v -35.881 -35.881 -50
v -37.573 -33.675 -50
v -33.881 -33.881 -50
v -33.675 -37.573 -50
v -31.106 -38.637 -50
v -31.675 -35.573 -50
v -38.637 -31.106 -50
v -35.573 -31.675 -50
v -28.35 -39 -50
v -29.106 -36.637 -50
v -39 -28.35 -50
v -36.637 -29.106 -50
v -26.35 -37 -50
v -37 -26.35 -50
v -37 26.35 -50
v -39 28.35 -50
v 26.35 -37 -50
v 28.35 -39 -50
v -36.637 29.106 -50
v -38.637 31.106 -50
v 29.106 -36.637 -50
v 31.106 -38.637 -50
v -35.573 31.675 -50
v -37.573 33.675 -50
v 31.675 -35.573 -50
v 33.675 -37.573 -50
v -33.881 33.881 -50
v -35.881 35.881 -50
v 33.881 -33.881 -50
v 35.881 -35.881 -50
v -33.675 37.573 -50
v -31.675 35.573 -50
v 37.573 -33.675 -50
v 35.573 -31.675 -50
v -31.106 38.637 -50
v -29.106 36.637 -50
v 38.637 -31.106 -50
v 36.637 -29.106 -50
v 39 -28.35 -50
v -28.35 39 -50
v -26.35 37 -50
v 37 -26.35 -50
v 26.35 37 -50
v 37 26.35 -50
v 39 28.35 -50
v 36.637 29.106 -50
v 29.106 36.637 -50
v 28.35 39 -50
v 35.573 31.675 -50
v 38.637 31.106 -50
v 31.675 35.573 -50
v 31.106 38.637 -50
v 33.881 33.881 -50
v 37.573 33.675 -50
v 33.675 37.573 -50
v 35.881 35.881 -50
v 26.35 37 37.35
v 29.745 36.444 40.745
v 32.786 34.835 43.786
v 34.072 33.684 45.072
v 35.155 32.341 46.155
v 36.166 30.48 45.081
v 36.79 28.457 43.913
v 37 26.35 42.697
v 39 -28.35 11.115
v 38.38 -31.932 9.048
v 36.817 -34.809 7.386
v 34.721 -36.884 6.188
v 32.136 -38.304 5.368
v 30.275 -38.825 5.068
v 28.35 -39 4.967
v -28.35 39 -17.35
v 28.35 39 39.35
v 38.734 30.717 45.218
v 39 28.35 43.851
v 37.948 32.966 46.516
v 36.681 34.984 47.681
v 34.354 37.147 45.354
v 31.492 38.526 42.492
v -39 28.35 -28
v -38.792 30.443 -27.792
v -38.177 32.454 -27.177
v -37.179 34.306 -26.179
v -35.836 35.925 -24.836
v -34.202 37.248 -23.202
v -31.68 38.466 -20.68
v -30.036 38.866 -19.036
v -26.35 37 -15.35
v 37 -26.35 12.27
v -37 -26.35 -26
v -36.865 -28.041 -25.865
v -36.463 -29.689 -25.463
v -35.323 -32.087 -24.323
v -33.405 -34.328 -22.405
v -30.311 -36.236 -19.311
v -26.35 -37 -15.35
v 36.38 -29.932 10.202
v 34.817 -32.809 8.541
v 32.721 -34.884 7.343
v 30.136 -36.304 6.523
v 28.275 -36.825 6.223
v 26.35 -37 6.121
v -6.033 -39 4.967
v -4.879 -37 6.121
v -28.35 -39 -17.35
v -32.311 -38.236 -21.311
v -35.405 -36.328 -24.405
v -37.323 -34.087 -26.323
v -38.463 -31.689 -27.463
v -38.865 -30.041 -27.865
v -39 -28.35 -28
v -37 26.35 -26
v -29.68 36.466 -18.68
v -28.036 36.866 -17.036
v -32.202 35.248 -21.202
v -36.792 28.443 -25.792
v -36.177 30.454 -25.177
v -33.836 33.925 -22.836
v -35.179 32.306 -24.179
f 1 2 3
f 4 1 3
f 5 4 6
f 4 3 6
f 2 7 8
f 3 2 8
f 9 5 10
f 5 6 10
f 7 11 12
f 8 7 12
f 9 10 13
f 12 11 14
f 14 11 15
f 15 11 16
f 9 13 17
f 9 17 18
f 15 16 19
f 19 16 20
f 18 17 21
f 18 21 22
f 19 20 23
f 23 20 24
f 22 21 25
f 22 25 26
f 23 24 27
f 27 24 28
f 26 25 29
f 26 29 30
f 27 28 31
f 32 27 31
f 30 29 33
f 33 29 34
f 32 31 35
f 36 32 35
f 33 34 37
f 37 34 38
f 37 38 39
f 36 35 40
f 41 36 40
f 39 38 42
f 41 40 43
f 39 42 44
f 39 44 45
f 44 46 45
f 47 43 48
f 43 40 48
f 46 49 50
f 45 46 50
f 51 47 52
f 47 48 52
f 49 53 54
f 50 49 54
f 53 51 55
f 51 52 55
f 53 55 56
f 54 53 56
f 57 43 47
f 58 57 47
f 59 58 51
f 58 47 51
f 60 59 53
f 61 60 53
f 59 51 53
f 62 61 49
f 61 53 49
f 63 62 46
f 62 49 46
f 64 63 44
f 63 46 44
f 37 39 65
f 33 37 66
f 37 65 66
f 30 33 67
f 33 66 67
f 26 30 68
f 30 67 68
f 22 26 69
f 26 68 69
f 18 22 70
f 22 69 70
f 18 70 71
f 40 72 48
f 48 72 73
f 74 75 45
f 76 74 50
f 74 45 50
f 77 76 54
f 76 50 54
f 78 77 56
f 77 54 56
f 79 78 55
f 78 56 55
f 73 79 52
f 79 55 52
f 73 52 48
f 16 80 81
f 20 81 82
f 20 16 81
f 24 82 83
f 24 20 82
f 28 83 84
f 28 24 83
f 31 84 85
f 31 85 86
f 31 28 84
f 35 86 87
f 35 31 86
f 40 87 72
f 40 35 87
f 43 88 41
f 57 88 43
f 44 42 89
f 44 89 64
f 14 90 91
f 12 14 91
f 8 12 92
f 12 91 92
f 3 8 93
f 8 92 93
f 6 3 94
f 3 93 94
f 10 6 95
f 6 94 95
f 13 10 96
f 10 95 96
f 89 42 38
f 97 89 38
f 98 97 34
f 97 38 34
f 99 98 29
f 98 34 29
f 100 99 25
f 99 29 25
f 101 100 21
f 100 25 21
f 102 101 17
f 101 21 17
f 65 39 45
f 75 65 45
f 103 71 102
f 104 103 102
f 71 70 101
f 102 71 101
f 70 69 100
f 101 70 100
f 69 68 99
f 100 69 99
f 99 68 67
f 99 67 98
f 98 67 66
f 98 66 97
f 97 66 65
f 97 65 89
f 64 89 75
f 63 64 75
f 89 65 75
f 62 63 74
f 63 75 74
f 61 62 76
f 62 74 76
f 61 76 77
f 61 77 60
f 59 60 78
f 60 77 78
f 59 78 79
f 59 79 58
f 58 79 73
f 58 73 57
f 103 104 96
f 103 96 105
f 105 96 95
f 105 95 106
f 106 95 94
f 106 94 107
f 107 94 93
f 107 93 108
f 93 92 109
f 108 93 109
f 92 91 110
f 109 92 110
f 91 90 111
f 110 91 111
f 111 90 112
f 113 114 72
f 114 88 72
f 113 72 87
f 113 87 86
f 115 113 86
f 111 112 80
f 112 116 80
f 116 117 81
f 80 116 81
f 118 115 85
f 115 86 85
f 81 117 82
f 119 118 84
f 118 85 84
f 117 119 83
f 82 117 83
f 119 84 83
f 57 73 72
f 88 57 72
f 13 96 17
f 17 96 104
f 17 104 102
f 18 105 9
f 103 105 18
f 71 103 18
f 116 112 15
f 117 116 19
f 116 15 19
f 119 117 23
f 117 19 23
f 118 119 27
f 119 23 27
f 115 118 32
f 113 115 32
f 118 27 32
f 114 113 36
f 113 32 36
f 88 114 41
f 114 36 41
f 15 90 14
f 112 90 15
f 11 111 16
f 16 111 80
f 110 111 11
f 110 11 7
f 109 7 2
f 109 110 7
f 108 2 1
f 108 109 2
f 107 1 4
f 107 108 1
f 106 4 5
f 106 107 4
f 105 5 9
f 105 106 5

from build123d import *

# Parameters (mm, degrees)
SKETCH1_W           = 78
SKETCH1_H           = 78
SKETCH1_W_2         = 74
SKETCH1_H_2         = 74
BOSS_EXTRUDE1_DEPTH = 50
FILLET1_R           = 10.65
CUT_EXTRUDE1_DEPTH  = 101.523629063
CUT_EXTRUDE2_DEPTH  = 101.523629063


with BuildPart() as part:
    # Sketch1 → Boss-Extrude1 (new, symmetric)
    with BuildSketch(Plane.XY):
        Rectangle(SKETCH1_W, SKETCH1_H)
        Rectangle(SKETCH1_W_2, SKETCH1_H_2, mode=Mode.SUBTRACT)
    extrude(amount=BOSS_EXTRUDE1_DEPTH, both=True)

    # Fillet1
    fillet1_edges = [part.edges().sort_by_distance(p)[0] for p in [
        (37, -37, 0),
        (37, 37, 0),
        (-37, 37, 0),
        (-37, -37, 0),
        (39, -39, 0),
        (-39, -39, 0),
        (-39, 39, 0),
        (39, 39, 0),
    ]]
    fillet(fillet1_edges, radius=FILLET1_R)

    # Sketch2 → Cut-Extrude1 (cut, through all)
    with BuildSketch(Plane(origin=(39, 0, 0), x_dir=(0, 0, -1), z_dir=(1, 0, 0))):
        Polygon((-50, 39), (-50, -39), (-4.966679003, -39), align=None)
    extrude(amount=-CUT_EXTRUDE1_DEPTH, mode=Mode.SUBTRACT)

    # Sketch3 → Cut-Extrude2 (cut, through all)
    with BuildSketch(Plane(origin=(0, 39, 0), x_dir=(1, 0, 0), z_dir=(0, 1, 0))):
        Polygon((-39, -50), (39, -50), (-39, 28), align=None)
    extrude(amount=-CUT_EXTRUDE2_DEPTH, mode=Mode.SUBTRACT)


solid = part.part
